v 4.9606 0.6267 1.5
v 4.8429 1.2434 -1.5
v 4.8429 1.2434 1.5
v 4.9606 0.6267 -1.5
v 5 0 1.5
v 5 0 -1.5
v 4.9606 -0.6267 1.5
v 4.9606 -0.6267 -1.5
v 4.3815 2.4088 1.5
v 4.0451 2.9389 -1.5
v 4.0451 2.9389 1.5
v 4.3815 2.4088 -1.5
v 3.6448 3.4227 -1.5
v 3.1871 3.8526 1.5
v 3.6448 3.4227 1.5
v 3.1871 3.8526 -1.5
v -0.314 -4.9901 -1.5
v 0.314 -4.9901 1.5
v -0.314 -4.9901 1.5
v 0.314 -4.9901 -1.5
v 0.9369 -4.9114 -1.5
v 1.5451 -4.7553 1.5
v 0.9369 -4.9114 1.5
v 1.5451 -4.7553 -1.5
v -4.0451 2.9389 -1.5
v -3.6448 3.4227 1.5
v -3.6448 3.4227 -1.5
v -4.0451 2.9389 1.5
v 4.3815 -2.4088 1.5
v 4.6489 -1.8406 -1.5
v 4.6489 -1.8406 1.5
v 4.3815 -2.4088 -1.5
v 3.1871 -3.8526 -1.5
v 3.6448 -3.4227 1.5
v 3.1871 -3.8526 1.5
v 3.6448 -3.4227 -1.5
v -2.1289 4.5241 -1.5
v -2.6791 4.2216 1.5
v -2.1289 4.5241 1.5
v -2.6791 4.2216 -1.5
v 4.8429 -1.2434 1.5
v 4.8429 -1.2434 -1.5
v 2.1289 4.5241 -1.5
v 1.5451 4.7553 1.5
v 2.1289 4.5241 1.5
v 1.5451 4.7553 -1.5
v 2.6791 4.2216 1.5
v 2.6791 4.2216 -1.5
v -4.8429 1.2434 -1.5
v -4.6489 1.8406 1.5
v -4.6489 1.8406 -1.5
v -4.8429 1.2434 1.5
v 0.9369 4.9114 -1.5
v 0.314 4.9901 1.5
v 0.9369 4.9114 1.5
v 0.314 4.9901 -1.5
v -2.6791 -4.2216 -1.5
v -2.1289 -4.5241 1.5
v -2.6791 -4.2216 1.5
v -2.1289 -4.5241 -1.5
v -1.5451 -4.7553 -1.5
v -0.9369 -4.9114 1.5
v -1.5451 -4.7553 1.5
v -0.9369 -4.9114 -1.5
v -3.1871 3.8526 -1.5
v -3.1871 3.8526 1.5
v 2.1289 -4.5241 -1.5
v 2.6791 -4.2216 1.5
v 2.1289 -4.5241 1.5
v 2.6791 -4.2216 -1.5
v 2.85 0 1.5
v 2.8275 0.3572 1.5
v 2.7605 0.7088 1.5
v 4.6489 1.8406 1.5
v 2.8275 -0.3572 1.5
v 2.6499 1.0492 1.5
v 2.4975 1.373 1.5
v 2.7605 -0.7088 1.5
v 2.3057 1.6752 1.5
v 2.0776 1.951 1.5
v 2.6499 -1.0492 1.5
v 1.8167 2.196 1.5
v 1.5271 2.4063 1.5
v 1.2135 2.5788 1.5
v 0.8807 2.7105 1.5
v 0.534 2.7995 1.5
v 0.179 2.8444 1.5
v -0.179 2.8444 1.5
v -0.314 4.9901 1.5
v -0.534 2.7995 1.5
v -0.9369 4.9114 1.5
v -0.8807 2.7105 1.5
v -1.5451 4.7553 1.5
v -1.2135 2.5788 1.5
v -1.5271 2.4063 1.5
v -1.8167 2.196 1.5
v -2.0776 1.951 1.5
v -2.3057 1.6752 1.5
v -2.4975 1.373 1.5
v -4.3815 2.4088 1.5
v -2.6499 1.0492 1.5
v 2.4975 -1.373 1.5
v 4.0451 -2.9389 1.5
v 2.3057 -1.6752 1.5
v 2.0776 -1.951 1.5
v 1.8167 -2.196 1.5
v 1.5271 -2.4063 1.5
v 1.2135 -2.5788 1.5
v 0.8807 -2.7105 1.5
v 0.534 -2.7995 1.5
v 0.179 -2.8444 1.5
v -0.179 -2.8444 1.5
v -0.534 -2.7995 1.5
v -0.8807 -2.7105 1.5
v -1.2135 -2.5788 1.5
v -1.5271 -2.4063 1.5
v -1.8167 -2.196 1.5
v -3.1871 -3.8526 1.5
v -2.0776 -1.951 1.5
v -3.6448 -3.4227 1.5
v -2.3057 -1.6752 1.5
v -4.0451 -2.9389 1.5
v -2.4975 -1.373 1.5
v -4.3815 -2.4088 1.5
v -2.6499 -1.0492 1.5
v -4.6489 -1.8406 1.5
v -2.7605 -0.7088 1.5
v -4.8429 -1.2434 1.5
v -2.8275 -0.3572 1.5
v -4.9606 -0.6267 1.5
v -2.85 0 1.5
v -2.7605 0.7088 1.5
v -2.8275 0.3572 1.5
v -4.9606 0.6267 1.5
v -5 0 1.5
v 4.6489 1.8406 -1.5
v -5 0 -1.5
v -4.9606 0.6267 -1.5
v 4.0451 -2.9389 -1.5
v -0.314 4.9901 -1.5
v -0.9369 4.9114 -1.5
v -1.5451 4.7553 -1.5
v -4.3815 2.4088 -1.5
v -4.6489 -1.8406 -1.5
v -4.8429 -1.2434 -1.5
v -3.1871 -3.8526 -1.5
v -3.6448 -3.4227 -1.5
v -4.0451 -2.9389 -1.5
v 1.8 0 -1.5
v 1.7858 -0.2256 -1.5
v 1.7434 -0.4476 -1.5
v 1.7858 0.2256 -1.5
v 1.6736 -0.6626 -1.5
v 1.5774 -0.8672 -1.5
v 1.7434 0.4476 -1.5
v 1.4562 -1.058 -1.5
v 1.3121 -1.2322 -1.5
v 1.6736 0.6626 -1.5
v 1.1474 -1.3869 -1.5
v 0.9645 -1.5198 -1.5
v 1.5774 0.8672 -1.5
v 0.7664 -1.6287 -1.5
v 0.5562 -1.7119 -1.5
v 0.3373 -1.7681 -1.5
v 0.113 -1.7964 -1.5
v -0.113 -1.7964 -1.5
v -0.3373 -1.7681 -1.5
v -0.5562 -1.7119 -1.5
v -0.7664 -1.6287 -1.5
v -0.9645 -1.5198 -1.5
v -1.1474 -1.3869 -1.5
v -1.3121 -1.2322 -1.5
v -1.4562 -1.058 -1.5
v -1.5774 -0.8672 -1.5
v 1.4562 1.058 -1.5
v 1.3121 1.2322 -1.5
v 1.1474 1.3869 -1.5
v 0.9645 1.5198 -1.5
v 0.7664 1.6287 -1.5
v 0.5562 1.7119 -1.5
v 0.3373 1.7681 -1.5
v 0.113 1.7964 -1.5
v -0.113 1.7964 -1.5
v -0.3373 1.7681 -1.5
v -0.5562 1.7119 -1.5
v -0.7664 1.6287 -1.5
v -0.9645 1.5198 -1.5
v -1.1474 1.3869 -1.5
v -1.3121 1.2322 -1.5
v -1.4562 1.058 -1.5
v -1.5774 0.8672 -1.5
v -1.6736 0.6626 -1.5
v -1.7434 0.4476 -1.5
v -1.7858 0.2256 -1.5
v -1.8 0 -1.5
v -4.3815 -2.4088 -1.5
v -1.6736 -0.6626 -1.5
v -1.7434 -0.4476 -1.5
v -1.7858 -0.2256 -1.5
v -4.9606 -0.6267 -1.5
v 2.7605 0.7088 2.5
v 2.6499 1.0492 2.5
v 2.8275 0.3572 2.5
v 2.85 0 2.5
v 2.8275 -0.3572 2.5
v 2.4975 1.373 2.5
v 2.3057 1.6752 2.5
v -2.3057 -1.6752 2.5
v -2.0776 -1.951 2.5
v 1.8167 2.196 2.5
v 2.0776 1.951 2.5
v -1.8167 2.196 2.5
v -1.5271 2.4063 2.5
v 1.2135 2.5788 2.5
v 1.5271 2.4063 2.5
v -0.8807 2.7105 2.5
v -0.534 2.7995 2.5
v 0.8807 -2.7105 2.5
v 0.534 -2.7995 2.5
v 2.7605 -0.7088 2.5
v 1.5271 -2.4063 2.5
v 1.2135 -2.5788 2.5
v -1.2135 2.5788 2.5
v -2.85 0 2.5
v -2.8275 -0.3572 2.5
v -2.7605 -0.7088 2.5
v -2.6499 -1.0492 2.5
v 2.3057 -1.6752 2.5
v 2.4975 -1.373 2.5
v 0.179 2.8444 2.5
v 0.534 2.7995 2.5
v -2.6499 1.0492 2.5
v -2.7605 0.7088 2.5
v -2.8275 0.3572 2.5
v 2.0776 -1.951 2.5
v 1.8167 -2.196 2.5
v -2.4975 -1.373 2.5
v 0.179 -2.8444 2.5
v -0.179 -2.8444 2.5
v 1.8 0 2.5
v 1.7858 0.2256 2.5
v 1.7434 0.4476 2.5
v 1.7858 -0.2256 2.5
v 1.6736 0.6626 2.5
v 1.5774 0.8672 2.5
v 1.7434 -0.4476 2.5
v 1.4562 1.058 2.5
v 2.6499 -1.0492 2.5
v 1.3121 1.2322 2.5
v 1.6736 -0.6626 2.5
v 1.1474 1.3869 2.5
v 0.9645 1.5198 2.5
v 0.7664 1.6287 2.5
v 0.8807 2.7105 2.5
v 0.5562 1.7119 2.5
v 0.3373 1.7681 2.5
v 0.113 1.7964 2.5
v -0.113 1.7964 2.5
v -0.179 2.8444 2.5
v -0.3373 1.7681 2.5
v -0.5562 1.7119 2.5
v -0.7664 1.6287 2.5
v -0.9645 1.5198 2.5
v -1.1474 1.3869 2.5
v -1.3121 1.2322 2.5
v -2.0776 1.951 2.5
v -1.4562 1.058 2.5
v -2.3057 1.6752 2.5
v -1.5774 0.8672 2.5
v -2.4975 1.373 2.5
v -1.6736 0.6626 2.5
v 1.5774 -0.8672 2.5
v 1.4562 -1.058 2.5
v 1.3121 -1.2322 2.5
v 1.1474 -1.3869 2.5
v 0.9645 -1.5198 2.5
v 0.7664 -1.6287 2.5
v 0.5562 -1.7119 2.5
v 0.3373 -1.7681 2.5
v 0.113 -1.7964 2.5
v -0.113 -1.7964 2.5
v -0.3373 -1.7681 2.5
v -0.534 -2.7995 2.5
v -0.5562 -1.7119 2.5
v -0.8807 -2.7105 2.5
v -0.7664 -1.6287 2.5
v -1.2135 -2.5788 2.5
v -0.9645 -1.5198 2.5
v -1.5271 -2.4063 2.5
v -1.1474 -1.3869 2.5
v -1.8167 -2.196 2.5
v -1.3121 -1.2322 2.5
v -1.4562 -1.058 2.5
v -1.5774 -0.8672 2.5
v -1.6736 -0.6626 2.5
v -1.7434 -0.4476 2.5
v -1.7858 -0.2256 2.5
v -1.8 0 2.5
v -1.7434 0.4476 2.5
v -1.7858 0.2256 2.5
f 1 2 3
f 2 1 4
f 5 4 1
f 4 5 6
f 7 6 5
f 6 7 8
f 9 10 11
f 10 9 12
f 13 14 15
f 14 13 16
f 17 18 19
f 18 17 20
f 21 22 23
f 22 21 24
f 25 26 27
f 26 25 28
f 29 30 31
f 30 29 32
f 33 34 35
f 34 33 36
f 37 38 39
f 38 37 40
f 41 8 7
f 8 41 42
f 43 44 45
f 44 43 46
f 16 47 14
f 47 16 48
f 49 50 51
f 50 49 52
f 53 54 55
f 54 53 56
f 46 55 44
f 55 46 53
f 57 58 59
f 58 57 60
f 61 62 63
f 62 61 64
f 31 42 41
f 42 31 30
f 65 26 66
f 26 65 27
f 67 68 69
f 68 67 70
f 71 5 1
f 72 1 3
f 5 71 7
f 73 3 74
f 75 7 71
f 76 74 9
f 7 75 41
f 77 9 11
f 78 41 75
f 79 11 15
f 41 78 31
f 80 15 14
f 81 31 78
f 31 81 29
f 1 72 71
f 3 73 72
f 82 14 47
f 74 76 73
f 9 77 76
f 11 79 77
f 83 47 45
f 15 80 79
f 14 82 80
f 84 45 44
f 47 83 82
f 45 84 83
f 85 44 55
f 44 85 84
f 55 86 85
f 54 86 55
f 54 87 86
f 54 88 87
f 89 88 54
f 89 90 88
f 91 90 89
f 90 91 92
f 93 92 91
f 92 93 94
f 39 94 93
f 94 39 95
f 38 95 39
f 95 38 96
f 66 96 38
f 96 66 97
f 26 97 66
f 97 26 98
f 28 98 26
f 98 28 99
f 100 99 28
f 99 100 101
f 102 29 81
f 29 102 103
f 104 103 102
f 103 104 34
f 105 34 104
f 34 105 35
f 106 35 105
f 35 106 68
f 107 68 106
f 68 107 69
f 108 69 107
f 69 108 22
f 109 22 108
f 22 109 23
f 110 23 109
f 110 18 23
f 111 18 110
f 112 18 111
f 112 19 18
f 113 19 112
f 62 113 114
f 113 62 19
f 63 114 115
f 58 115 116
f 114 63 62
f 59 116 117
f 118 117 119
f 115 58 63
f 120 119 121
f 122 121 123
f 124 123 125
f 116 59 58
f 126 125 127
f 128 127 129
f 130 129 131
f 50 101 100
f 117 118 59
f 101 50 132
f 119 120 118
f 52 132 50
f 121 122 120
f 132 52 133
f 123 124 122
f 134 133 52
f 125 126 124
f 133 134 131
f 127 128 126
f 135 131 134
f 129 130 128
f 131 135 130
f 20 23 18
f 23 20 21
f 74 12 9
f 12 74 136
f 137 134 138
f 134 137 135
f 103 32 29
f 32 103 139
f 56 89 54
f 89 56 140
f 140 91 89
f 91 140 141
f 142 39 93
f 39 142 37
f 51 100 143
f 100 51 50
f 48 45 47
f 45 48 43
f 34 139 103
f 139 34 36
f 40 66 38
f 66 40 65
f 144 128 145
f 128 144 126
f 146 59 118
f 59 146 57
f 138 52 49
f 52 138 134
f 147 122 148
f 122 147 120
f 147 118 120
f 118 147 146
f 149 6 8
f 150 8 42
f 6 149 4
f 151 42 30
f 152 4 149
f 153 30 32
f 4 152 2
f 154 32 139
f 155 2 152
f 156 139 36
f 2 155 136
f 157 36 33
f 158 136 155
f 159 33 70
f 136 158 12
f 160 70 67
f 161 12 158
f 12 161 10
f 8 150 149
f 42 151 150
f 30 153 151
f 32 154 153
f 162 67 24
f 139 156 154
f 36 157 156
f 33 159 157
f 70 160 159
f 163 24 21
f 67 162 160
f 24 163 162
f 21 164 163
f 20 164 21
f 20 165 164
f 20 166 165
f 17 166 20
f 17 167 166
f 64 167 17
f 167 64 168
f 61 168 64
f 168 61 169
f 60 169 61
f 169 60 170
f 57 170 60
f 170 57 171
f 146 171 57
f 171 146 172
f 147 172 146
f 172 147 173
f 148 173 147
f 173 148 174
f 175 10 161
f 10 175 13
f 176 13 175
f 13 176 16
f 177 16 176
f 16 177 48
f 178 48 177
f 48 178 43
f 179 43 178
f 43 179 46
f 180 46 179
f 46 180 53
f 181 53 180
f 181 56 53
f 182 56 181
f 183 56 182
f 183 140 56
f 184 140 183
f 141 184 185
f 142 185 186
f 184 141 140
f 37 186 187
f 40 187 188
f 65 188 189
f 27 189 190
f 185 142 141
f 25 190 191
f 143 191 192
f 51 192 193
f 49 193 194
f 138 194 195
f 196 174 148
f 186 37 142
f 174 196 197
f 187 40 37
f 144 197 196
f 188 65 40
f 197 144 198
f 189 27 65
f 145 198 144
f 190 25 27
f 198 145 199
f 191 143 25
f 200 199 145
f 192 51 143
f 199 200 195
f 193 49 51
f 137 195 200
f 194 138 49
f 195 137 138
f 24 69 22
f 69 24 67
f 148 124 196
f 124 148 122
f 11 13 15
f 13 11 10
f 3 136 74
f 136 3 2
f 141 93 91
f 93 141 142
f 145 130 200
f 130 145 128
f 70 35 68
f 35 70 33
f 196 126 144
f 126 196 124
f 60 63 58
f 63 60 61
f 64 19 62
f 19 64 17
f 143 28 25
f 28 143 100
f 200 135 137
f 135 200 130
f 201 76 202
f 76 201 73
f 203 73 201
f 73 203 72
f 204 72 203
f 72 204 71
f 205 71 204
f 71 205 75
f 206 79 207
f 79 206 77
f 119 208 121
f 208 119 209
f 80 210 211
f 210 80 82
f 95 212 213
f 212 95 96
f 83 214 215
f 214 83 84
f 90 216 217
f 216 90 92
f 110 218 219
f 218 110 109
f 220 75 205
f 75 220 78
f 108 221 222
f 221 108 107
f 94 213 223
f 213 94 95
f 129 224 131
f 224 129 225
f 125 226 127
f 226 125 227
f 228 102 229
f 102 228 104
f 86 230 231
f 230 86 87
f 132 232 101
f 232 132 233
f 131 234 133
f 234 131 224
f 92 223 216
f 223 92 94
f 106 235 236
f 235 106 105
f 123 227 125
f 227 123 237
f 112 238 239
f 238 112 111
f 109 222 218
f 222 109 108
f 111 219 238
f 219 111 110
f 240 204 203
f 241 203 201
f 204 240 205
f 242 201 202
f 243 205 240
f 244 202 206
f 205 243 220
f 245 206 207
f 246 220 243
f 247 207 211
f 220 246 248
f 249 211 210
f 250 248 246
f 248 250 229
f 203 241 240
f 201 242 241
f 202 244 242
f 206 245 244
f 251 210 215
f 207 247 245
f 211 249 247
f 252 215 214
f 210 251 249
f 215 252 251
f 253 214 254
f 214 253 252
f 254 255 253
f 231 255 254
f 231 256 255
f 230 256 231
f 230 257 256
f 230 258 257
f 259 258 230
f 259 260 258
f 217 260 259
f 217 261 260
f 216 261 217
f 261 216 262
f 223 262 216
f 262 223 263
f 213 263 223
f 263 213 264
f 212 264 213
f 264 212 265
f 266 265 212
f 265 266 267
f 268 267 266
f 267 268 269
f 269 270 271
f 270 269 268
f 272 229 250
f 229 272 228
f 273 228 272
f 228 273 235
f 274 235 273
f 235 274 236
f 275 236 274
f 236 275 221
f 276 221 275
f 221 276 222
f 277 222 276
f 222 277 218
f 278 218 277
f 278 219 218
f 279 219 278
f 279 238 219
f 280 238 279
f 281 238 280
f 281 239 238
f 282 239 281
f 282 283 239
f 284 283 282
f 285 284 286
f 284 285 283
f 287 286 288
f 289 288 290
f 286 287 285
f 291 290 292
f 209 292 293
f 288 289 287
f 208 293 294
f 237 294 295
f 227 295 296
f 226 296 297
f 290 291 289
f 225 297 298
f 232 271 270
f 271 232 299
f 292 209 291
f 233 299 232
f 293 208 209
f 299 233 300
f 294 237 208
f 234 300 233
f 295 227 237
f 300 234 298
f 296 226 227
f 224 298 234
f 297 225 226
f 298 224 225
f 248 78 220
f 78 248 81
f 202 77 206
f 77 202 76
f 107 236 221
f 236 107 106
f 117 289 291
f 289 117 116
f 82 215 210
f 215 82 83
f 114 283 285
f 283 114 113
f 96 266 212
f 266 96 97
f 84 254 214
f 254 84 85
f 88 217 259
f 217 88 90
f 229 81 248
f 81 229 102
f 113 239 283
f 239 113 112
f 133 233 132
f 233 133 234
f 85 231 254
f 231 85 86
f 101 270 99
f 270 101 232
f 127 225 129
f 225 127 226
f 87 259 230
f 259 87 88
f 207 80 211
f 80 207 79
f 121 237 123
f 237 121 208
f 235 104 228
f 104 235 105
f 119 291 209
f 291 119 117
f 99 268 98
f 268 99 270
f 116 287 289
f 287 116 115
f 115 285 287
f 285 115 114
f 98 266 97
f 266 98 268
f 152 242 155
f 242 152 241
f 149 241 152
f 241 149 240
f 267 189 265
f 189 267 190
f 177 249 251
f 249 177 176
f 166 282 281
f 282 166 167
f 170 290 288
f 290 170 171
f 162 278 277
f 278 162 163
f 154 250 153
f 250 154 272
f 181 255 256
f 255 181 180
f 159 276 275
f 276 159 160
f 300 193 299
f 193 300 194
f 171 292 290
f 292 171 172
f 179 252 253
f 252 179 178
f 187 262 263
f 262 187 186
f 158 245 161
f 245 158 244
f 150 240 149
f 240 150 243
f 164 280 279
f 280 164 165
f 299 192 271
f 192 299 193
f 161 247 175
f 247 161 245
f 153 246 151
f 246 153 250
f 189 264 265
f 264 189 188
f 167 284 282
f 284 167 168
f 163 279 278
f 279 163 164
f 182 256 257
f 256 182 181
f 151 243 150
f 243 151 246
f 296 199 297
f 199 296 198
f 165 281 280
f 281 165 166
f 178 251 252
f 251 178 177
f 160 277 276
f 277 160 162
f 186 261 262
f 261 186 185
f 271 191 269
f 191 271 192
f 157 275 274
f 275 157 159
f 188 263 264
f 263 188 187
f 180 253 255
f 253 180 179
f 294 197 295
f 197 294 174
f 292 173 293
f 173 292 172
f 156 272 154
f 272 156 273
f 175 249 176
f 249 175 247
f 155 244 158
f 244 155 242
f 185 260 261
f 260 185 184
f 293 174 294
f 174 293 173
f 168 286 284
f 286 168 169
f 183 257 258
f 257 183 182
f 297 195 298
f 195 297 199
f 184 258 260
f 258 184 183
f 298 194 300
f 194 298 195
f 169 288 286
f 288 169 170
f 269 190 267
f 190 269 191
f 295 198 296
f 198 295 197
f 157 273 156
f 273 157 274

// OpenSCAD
$fn = 50;


difference() {
	union() {
		translate(v = [0, 0, -1.5000000000]) {
			cylinder(h = 3, r = 5.0000000000);
		}
		translate(v = [0, 0, -1.5000000000]) {
			cylinder(h = 4, r = 2.8500000000);
		}
	}
	union() {
		translate(v = [0, 0, -50.0000000000]) {
			cylinder(h = 100, r = 1.8000000000);
		}
	}
}
